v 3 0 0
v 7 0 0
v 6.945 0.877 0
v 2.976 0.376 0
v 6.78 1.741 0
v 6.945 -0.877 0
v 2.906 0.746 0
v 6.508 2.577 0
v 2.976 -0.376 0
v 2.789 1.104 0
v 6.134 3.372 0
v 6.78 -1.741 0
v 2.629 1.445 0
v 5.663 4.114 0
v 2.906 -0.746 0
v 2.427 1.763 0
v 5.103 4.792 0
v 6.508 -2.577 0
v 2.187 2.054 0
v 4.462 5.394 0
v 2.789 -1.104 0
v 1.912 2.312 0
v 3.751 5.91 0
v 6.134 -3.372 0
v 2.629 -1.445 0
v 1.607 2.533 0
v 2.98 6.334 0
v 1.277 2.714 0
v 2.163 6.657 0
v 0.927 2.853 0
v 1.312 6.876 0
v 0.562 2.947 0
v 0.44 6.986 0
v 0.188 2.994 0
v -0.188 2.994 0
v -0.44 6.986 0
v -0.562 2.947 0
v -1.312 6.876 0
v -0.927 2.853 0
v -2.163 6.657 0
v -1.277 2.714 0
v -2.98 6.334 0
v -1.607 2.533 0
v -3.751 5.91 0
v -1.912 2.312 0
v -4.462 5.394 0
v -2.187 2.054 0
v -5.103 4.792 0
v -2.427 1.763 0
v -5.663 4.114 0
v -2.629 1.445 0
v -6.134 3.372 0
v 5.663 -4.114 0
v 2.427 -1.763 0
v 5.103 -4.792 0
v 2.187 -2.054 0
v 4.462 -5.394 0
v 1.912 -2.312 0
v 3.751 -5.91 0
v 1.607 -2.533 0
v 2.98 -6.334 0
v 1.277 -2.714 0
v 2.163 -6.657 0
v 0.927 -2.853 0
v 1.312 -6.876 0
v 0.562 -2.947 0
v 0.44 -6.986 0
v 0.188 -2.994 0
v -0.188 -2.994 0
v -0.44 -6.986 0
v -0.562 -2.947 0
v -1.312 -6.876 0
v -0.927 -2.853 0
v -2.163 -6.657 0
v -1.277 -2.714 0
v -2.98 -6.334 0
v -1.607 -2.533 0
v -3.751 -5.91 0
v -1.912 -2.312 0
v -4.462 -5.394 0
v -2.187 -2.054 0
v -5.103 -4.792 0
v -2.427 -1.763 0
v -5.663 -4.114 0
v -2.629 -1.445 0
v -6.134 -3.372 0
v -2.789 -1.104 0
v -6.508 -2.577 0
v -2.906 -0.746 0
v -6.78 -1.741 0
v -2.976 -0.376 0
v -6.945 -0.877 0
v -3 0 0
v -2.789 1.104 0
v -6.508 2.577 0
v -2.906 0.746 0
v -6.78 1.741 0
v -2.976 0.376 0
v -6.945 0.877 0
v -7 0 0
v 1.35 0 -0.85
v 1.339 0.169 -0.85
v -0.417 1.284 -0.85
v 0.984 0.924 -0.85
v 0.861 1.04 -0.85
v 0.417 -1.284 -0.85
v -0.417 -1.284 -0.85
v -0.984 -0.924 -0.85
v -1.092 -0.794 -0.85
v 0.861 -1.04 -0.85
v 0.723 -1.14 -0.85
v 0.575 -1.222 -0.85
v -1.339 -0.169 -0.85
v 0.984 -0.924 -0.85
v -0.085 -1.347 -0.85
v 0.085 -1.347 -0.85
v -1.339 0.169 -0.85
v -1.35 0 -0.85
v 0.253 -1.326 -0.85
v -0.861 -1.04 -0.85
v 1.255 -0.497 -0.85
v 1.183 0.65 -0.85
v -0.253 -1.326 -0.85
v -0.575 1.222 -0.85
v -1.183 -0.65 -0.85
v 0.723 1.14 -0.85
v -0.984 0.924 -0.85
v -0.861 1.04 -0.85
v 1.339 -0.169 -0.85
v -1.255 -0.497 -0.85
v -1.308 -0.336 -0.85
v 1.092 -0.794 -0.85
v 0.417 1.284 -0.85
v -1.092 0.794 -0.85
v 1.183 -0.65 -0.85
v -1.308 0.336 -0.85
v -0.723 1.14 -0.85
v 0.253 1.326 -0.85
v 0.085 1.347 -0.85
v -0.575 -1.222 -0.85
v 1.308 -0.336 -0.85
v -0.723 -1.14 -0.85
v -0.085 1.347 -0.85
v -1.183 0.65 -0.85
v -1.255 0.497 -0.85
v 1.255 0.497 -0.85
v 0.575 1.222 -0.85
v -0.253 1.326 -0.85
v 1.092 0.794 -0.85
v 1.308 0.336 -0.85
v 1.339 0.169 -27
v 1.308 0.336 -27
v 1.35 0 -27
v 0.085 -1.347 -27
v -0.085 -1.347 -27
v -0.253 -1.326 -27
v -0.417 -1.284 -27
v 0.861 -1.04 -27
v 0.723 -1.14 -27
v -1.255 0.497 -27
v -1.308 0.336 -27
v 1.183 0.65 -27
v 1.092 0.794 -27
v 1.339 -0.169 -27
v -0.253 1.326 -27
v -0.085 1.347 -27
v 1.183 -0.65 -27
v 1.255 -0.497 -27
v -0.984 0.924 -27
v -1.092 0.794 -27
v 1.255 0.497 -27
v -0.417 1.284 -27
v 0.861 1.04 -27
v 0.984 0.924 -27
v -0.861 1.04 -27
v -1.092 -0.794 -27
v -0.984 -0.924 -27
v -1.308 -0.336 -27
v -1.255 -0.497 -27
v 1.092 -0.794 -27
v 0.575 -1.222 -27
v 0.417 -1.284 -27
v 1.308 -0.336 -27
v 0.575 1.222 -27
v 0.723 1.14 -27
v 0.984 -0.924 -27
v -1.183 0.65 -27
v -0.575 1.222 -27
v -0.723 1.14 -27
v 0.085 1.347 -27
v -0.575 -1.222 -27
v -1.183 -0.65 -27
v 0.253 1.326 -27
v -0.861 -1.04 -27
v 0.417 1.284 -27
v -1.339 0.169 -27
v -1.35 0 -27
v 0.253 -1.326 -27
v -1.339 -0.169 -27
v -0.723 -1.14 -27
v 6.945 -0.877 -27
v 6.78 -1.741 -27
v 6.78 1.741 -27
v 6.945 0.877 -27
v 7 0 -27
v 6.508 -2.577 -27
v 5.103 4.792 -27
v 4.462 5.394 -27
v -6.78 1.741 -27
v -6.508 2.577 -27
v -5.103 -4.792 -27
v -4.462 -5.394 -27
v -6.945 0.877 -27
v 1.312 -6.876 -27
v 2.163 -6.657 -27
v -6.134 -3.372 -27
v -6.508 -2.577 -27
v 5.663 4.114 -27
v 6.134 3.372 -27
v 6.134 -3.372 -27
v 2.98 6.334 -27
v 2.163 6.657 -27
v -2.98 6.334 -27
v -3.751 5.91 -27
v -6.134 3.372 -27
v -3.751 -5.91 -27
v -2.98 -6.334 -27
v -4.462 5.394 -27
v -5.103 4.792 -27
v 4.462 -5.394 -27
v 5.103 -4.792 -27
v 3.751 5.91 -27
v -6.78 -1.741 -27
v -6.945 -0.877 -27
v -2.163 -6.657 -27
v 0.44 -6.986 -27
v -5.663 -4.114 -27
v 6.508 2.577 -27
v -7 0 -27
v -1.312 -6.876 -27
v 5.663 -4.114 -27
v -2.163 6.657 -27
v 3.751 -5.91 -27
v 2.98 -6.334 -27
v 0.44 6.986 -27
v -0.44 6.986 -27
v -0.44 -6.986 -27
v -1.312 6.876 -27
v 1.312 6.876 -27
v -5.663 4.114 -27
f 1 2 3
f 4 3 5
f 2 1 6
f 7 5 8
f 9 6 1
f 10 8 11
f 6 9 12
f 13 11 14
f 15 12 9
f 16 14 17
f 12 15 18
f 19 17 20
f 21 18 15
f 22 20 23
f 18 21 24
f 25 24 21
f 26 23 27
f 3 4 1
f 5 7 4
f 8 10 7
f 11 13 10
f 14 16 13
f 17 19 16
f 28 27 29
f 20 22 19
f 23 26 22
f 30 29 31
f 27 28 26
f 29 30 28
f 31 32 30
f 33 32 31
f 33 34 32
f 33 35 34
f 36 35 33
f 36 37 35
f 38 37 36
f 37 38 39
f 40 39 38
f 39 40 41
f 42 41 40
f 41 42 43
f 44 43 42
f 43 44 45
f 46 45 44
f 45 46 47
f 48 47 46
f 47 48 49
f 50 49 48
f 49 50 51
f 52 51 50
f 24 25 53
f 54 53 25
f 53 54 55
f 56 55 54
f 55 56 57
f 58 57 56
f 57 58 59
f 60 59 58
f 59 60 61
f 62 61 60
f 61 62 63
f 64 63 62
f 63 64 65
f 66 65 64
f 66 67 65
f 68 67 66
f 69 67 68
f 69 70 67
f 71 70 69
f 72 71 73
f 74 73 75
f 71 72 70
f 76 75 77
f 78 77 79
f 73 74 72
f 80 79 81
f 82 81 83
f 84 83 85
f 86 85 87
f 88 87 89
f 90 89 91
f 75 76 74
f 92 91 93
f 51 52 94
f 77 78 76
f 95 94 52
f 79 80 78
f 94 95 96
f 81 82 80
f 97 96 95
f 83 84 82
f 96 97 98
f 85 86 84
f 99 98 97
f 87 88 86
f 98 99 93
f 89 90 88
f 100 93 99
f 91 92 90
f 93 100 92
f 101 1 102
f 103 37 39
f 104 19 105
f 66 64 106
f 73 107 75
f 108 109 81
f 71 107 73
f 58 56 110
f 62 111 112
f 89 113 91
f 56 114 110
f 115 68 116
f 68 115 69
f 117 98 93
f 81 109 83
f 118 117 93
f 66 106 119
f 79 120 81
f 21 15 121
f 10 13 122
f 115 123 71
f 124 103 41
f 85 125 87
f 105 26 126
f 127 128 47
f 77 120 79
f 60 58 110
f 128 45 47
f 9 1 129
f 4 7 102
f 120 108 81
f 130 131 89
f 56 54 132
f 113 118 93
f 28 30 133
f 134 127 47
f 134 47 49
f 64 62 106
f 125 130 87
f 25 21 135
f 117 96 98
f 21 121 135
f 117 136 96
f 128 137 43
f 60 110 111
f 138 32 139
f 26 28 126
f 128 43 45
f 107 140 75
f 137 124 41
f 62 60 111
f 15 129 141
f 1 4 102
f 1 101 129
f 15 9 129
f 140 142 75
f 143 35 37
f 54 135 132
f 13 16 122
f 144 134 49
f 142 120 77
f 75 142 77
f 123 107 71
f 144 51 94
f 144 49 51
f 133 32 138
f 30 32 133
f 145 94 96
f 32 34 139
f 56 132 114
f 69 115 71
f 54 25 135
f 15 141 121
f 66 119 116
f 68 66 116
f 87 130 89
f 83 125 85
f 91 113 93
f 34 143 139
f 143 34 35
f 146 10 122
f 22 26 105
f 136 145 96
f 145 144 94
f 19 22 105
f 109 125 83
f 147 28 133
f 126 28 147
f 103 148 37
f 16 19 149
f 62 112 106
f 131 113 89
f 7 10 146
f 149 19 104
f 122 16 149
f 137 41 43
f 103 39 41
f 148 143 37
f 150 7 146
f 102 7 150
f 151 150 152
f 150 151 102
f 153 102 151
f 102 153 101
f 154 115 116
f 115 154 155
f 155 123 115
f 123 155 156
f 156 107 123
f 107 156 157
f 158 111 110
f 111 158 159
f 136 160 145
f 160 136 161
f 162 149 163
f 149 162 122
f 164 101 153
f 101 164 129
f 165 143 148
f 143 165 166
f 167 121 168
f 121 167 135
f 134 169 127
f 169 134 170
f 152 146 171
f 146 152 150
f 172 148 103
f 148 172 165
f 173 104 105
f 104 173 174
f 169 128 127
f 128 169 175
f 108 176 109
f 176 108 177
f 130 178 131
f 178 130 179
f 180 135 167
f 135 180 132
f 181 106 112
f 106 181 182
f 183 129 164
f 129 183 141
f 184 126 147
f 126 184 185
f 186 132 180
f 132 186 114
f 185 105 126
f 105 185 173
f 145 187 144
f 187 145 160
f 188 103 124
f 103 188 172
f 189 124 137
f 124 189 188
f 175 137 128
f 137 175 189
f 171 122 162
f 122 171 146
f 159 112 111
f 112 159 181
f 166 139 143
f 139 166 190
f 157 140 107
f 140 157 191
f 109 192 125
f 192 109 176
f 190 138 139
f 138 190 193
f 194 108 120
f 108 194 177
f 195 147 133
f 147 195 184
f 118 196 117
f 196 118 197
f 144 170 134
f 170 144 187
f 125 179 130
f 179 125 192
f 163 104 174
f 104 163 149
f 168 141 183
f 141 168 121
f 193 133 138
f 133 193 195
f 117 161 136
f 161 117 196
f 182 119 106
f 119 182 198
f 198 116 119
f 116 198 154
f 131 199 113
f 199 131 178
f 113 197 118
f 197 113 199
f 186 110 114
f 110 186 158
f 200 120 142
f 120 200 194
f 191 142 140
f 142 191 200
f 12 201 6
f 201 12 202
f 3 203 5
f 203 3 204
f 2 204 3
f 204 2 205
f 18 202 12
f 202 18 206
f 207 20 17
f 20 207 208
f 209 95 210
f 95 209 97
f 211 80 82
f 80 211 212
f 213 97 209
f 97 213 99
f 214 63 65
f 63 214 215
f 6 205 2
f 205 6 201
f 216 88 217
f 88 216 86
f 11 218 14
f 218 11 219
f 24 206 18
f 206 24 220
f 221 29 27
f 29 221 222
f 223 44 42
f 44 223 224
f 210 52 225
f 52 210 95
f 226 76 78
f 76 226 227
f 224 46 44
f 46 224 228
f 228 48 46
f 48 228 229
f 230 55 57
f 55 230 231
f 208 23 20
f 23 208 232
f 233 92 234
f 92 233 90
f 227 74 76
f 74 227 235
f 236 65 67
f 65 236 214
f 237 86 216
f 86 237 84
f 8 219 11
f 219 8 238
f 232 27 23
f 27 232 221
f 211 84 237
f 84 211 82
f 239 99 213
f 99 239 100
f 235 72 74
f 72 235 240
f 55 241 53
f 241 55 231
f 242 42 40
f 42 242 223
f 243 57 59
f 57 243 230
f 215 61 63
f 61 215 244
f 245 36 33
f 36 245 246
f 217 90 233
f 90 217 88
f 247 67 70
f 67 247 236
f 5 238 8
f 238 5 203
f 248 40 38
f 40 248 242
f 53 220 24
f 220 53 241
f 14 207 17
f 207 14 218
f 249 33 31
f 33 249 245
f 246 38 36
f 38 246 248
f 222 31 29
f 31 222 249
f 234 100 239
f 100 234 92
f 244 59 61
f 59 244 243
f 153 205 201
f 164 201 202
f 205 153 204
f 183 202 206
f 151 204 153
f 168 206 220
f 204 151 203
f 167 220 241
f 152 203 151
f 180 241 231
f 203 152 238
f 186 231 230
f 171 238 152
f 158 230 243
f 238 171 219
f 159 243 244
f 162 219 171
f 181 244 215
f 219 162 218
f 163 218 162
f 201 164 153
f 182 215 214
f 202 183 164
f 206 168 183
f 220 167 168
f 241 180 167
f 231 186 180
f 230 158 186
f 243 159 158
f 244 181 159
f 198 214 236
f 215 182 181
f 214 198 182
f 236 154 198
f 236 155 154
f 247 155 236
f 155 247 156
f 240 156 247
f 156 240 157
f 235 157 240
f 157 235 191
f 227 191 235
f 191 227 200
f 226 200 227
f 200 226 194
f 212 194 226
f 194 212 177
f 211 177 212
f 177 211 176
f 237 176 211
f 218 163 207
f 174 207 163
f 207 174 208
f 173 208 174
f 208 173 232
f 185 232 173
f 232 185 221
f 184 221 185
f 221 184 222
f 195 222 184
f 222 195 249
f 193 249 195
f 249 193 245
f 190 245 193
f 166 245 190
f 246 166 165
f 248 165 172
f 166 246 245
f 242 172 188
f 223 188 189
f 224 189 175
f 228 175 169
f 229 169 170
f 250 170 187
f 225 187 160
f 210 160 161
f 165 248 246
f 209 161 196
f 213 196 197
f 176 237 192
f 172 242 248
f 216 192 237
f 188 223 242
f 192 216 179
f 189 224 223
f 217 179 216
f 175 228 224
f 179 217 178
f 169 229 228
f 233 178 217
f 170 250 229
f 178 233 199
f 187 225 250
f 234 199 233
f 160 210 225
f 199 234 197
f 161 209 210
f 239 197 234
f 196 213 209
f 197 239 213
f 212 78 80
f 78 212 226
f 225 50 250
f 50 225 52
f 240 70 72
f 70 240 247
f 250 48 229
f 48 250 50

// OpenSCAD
$fn = 50;


difference() {
	union() {
		translate(v = [0, 0, -27.0000000000]) {
			cylinder(h = 27, r = 7.0000000000);
		}
	}
	union() {
		translate(v = [0, 0, 0]) {
			rotate(a = [0, 0, 0]) {
				difference() {
					union() {
						translate(v = [0, 0, -30.0000000000]) {
							cylinder(h = 30, r = 1.0000000000);
						}
						translate(v = [0, 0, -0.8500000000]) {
							cylinder(h = 0.8500000000, r1 = 1.3500000000, r2 = 3.0000000000);
						}
						translate(v = [0, 0, -30.0000000000]) {
							cylinder(h = 30, r = 1.3500000000);
						}
						translate(v = [0, 0, -30.0000000000]) {
							cylinder(h = 30, r = 1.0000000000);
						}
					}
					union();
				}
			}
		}
	}
}
